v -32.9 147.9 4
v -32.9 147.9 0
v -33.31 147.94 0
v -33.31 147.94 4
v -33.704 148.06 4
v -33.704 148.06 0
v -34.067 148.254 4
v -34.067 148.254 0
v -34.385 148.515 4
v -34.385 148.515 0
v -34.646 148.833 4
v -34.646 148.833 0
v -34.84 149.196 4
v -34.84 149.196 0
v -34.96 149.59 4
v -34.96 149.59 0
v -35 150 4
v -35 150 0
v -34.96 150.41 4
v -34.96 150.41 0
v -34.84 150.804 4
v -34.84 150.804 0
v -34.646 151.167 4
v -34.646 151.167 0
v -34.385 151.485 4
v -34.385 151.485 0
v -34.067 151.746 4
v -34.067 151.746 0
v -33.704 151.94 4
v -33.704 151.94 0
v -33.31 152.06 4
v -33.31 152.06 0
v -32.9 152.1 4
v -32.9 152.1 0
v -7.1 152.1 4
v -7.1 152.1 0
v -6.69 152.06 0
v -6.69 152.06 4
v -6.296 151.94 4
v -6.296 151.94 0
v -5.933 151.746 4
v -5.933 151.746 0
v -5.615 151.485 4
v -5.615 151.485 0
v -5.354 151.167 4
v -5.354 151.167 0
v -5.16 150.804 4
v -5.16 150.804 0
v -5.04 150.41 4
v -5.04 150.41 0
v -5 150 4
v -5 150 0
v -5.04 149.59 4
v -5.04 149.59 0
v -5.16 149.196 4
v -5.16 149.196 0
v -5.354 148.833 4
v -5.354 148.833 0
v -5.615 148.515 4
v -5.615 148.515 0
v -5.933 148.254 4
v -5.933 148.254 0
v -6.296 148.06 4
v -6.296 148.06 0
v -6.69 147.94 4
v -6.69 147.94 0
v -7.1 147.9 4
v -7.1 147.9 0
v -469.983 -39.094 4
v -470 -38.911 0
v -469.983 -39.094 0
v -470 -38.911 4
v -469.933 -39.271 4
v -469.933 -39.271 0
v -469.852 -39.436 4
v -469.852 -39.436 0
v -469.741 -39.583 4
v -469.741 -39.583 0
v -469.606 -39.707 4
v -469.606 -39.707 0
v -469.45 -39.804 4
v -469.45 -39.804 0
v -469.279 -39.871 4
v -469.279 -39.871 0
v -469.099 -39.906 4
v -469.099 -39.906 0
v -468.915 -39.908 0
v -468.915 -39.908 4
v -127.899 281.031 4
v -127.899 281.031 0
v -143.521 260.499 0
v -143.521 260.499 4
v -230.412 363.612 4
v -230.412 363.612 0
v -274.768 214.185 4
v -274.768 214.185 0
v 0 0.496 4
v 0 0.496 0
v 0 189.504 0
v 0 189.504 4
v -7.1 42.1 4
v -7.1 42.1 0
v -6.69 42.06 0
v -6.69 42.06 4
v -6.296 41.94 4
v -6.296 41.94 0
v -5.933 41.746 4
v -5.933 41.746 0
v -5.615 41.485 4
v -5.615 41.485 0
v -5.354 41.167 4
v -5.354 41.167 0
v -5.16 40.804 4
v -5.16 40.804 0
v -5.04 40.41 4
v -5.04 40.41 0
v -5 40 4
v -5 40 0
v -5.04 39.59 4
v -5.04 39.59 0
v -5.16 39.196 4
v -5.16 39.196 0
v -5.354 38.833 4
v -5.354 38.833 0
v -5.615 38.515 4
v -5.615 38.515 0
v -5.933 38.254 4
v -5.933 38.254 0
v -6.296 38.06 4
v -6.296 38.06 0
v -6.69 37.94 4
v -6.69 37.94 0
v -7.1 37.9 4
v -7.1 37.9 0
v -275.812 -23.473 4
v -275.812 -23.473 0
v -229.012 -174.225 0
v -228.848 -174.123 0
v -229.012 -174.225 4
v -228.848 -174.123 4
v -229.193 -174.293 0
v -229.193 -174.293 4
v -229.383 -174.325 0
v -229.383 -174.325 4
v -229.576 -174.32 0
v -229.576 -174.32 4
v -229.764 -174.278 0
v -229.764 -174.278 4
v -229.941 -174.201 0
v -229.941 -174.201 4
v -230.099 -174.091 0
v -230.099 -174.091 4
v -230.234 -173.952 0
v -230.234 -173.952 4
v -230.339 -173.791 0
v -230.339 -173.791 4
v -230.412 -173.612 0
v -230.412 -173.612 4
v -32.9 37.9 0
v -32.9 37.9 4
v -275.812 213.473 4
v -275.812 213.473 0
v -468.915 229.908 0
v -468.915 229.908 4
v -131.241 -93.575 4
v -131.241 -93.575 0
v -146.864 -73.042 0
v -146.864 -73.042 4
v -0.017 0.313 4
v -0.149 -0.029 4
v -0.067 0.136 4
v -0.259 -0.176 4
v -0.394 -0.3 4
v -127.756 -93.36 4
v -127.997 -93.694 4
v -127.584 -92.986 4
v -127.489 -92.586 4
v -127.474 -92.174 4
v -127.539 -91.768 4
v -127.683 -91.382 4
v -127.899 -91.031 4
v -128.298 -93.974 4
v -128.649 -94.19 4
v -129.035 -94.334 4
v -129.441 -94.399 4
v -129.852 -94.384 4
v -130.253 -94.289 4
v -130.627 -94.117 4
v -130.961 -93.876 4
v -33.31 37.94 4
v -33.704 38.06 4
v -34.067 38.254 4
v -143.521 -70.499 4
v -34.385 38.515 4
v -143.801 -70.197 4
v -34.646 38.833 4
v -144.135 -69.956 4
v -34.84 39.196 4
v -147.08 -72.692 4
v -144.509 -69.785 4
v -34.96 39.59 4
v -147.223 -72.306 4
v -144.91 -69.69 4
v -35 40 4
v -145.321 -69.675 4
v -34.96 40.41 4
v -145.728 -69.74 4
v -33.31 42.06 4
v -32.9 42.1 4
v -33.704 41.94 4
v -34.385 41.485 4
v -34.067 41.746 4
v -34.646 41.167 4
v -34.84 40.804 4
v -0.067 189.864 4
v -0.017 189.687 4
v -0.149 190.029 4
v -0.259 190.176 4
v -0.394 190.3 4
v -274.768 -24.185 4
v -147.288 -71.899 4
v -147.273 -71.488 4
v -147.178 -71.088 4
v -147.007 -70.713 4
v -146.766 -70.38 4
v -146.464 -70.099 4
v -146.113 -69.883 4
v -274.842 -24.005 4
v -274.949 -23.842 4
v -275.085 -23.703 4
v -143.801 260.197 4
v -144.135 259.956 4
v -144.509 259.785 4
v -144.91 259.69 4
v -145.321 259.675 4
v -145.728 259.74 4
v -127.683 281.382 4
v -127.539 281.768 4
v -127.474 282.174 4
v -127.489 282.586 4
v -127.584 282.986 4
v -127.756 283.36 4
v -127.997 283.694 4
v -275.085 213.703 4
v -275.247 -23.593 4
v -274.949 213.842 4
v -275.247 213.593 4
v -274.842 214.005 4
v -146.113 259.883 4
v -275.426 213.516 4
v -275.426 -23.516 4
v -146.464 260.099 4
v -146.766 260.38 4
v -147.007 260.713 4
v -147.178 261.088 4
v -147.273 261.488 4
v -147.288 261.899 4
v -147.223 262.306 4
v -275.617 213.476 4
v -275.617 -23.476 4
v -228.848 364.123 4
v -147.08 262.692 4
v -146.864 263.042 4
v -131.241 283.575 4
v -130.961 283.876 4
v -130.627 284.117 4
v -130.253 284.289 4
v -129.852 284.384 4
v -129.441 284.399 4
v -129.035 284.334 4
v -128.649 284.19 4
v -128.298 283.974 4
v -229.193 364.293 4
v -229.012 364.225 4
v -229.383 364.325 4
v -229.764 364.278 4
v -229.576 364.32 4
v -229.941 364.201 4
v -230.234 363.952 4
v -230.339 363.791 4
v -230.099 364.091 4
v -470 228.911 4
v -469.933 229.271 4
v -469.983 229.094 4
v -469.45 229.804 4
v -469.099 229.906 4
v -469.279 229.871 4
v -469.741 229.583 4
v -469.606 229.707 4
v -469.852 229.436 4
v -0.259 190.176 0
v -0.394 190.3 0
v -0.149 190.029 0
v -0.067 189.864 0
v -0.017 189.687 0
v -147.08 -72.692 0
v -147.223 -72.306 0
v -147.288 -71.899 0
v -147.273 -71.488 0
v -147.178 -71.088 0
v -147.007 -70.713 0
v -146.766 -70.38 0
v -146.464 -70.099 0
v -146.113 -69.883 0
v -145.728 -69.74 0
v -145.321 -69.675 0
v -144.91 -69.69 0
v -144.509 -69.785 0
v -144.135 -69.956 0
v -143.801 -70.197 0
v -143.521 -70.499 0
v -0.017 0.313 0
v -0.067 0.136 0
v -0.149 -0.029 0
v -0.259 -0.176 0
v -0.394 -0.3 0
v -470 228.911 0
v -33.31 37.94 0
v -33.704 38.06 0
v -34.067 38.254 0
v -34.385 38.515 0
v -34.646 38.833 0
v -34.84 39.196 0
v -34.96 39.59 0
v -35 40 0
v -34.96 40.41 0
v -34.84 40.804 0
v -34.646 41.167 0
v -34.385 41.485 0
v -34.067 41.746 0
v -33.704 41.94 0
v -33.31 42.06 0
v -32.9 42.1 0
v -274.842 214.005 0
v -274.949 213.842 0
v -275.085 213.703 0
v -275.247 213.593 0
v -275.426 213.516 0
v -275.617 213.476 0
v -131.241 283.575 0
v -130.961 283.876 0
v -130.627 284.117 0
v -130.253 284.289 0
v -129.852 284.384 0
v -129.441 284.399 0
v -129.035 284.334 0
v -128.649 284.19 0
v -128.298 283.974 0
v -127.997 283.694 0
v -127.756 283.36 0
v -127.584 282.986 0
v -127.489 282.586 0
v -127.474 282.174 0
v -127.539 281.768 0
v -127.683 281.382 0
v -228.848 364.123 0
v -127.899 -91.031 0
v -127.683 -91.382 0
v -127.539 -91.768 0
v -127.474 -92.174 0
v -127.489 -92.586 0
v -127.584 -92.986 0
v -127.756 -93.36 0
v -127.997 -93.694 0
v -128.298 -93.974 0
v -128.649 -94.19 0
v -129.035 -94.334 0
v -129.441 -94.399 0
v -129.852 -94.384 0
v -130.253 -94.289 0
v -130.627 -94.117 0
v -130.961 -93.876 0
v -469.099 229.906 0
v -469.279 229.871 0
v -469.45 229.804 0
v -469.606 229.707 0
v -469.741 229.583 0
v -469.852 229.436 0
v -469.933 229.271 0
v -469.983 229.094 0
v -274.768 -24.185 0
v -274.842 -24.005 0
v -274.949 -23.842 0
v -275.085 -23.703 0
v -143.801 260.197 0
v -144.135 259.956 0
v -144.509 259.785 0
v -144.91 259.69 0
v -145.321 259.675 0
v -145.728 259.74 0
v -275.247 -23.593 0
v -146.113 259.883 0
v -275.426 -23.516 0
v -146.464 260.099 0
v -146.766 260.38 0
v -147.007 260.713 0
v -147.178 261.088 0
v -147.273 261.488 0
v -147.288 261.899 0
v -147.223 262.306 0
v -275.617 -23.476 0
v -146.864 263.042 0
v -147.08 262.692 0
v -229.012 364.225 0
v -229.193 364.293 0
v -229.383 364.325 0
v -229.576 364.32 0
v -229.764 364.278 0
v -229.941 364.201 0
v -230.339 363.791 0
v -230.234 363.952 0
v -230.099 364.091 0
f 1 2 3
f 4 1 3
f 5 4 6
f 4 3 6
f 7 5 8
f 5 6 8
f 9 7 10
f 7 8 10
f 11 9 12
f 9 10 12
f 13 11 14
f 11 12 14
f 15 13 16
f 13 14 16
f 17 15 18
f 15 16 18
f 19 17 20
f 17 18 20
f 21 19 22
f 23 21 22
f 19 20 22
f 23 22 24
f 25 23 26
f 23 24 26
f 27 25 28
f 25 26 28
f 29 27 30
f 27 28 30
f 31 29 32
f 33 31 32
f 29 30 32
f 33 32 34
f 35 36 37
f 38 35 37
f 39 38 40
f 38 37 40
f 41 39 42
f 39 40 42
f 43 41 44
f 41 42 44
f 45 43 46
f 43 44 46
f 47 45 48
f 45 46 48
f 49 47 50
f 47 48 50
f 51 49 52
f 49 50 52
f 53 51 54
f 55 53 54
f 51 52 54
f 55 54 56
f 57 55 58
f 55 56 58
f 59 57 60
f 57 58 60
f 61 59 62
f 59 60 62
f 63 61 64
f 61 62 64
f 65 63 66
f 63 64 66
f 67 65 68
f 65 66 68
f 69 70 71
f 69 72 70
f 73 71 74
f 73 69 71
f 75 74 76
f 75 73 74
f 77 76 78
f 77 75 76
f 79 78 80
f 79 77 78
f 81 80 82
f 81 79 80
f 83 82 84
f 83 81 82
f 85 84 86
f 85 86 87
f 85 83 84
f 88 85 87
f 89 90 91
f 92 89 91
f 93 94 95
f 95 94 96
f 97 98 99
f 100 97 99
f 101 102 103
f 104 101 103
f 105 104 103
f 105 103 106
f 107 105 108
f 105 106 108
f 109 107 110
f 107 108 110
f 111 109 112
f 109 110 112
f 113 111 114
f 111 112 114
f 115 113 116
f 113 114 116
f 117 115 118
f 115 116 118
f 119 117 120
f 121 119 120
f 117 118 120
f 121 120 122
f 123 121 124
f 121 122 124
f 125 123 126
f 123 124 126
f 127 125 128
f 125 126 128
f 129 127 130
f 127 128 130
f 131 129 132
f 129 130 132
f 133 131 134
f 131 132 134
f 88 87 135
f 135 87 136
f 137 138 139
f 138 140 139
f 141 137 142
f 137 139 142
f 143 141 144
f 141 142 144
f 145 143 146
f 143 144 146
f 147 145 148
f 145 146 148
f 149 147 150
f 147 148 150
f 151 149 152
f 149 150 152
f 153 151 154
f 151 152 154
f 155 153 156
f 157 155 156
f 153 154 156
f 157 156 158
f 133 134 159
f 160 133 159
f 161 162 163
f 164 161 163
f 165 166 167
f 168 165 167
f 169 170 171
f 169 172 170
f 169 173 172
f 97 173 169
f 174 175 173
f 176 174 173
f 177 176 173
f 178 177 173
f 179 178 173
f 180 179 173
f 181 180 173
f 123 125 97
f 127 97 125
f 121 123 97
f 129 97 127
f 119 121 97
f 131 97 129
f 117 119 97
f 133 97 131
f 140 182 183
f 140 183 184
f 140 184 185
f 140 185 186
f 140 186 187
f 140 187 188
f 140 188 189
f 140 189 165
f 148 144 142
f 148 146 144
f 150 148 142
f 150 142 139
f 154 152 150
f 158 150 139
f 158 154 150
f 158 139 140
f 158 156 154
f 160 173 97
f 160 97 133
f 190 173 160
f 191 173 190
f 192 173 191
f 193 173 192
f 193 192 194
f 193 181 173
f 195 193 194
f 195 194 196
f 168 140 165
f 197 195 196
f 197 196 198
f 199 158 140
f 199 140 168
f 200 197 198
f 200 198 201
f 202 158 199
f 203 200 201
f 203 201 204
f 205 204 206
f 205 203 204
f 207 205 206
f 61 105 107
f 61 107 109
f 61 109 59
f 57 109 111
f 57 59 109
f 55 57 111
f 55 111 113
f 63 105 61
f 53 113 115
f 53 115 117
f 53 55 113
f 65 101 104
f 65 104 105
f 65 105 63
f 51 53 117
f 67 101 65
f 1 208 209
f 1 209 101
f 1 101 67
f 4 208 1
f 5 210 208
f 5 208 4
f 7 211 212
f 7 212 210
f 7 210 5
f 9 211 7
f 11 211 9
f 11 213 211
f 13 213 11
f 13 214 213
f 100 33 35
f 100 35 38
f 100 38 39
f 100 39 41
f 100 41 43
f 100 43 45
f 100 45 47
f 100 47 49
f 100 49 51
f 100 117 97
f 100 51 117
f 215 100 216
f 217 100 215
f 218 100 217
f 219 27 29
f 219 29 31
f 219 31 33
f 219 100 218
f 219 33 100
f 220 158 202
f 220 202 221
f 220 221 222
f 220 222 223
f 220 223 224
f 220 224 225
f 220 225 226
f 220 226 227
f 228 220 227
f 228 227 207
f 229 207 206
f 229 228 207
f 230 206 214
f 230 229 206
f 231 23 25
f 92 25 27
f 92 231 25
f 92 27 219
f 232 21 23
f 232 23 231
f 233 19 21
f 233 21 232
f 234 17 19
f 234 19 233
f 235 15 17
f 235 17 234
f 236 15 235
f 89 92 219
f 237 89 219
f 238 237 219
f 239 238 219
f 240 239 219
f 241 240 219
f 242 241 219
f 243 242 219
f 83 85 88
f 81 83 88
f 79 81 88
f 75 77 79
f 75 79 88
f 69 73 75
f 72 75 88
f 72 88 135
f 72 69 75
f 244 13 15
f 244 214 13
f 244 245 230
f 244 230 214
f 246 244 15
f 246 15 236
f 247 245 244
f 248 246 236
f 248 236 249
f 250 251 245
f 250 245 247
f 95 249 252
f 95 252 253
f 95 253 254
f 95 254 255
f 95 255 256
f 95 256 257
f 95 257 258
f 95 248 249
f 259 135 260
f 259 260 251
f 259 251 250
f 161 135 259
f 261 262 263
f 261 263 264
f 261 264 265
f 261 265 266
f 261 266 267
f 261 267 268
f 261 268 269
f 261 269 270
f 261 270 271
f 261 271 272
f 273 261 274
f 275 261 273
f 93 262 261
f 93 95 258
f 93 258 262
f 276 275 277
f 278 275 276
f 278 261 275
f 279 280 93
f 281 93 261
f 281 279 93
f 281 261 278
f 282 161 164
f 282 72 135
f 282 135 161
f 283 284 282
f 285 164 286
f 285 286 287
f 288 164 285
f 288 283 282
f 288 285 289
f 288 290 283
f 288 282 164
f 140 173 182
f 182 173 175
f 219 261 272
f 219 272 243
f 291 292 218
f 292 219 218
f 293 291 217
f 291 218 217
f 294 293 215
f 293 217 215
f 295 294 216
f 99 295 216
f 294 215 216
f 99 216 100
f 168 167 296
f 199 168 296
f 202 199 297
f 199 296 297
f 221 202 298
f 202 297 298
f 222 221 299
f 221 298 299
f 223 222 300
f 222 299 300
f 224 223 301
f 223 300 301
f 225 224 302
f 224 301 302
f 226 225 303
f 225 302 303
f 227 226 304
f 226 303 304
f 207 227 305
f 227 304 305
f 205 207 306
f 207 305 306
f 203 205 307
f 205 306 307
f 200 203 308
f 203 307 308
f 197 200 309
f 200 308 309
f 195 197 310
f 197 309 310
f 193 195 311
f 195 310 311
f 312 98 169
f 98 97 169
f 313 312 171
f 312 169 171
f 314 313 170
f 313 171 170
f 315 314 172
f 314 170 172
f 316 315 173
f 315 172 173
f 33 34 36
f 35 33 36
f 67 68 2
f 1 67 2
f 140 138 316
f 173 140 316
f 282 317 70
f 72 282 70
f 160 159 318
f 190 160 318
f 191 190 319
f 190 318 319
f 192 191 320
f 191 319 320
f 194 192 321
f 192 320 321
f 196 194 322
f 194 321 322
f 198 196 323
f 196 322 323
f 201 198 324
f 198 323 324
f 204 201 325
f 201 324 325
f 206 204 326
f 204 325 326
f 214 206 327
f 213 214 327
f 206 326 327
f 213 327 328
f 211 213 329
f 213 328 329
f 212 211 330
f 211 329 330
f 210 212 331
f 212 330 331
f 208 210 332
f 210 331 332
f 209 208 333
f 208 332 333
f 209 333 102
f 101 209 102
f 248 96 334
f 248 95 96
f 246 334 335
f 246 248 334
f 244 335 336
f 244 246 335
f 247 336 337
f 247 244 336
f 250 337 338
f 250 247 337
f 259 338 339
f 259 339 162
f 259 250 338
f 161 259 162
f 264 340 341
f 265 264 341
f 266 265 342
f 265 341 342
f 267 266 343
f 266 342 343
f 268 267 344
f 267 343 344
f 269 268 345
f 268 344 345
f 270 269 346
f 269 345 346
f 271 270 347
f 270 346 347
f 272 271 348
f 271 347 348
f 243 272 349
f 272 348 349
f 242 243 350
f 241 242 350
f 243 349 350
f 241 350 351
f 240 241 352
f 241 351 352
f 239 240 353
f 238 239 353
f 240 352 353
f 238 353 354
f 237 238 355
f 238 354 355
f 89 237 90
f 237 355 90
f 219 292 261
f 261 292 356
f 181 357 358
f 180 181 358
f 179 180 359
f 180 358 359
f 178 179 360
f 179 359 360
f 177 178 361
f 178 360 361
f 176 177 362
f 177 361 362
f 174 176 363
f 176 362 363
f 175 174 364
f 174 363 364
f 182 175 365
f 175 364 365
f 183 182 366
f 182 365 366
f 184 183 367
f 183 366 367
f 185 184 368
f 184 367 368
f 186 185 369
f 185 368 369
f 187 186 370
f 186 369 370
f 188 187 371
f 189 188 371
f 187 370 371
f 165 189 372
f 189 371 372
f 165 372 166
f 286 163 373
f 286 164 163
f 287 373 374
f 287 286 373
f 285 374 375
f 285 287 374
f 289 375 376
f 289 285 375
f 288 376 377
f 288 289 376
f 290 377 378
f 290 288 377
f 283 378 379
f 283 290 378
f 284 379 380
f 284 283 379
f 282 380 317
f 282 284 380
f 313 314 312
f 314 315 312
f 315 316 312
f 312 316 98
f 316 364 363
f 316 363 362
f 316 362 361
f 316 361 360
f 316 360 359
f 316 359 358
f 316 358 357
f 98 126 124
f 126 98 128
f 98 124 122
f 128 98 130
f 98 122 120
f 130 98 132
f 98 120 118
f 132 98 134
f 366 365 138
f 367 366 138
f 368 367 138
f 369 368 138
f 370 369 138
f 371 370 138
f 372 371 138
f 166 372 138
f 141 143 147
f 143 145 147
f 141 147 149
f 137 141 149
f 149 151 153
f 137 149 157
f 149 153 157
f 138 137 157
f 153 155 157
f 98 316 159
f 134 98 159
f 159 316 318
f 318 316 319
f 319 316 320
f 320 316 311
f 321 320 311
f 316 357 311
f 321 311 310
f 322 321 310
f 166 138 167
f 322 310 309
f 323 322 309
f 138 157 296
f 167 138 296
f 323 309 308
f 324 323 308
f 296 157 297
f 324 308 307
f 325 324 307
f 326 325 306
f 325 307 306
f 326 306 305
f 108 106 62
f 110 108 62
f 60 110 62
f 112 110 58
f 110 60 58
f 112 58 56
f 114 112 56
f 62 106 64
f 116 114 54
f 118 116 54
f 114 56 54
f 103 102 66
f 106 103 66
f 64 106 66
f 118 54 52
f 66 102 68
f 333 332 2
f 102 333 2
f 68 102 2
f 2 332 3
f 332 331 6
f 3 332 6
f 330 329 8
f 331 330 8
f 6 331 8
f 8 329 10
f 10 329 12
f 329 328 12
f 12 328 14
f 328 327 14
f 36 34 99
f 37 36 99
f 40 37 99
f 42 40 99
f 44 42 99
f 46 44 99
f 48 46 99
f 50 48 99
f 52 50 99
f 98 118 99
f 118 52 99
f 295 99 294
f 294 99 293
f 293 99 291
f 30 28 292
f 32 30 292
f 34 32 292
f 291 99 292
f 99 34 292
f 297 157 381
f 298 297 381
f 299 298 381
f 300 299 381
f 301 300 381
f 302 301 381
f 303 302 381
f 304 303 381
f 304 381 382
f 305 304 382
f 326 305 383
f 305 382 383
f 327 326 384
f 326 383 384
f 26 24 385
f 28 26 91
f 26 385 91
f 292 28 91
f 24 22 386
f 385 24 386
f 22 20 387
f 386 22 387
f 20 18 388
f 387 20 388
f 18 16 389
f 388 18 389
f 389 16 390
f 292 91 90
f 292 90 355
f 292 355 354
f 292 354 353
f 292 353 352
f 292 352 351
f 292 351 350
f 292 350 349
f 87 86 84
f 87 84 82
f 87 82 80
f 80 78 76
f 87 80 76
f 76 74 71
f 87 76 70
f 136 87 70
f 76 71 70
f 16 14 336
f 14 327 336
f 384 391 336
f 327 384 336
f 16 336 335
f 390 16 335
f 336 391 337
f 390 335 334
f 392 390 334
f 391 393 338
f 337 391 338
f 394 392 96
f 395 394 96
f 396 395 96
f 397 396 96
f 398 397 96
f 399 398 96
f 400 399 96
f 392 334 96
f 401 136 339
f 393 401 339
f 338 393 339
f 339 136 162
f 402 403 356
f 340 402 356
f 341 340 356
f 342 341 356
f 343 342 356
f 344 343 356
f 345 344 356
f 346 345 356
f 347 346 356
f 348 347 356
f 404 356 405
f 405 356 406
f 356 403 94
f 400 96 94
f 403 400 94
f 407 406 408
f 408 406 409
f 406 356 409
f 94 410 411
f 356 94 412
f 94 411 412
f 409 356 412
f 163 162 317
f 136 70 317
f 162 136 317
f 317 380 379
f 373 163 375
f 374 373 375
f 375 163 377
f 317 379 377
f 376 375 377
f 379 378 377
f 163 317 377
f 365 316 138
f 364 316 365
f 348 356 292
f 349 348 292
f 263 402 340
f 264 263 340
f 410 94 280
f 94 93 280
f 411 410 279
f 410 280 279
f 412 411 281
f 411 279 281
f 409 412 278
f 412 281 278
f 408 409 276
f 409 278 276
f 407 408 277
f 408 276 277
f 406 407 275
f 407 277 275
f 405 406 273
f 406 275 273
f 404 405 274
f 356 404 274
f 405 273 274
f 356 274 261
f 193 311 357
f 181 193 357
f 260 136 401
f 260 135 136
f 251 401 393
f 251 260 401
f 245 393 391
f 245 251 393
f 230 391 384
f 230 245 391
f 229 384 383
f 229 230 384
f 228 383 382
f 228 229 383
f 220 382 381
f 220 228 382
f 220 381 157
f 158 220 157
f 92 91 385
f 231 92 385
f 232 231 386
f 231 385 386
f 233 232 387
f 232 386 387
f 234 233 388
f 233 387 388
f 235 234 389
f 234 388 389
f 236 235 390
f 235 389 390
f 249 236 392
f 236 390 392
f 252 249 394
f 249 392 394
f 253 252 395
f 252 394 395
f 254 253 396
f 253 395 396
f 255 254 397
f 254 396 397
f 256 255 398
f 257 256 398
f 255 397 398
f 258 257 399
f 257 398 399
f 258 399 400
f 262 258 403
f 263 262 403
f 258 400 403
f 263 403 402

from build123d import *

# Parameters (mm, degrees)
BOSS_EXTRUDE1_DEPTH = 4
FILLET1_R           = 1


with BuildPart() as part:
    # Sketch1 → Boss-Extrude1 (new body)
    # profile 1 of 3: a face of its own
    with BuildSketch(Plane(origin=(0, 0, 0), x_dir=(0, 1, 0), z_dir=(0, 0, 1))):
        Polygon((-23.404255319, 275), (0, 0), (190, 0), (213.404255319, 275), (230, 470), (-40, 470), align=None)
        with BuildLine():
            ThreePointArc((37.9, 32.9), (40, 35), (42.1, 32.9))
            Line((42.1, 32.9), (42.1, 7.1))
            ThreePointArc((42.1, 7.1), (40, 5), (37.9, 7.1))
            Line((37.9, 7.1), (37.9, 32.9))
        make_face(mode=Mode.SUBTRACT)
        with BuildLine():
            Line((147.9, 7.1), (147.9, 32.9))
            ThreePointArc((147.9, 32.9), (150, 35), (152.1, 32.9))
            Line((152.1, 32.9), (152.1, 7.1))
            ThreePointArc((152.1, 7.1), (150, 5), (147.9, 7.1))
        make_face(mode=Mode.SUBTRACT)
    # profile 2 of 3: a face of its own
    with BuildSketch(Plane(origin=(0, 0, 0), x_dir=(0, 1, 0), z_dir=(0, 0, 1))):
        Polygon((-175, 230), (0, 0), (-23.404255319, 275), align=None)
        with BuildLine():
            ThreePointArc((-91.031422458, 127.898638669), (-93.974258564, 128.298283078), (-93.574614155, 131.241119184))
            Line((-93.574614155, 131.241119184), (-73.042233846, 146.863582462))
            ThreePointArc((-73.042233846, 146.863582462), (-70.099397741, 146.463938053), (-70.49904215, 143.521101947))
            Line((-70.49904215, 143.521101947), (-91.031422458, 127.898638669))
        make_face(mode=Mode.SUBTRACT)
    # profile 3 of 3: a face of its own
    with BuildSketch(Plane(origin=(0, 0, 0), x_dir=(0, 1, 0), z_dir=(0, 0, 1))):
        Polygon((213.404255319, 275), (190, 0), (365, 230), align=None)
        with BuildLine():
            Line((263.042233846, 146.863582462), (283.574614155, 131.241119184))
            ThreePointArc((283.574614155, 131.241119184), (283.974258564, 128.298283078), (281.031422458, 127.898638669))
            Line((281.031422458, 127.898638669), (260.49904215, 143.521101947))
            ThreePointArc((260.49904215, 143.521101947), (260.099397741, 146.463938053), (263.042233846, 146.863582462))
        make_face(mode=Mode.SUBTRACT)
    extrude(amount=BOSS_EXTRUDE1_DEPTH)

    # Fillet1
    fillet1_edges = [part.edges().sort_by_distance(p)[0] for p in [
        (-275, -23.404255319, 2),
        (-470, -40, 2),
        (-470, 230, 2),
        (-275, 213.404255319, 2),
        (-230, 365, 2),
        (0, 190, 2),
        (0, 0, 2),
        (-230, -175, 2),
    ]]
    fillet(fillet1_edges, radius=FILLET1_R)


solid = part.part
